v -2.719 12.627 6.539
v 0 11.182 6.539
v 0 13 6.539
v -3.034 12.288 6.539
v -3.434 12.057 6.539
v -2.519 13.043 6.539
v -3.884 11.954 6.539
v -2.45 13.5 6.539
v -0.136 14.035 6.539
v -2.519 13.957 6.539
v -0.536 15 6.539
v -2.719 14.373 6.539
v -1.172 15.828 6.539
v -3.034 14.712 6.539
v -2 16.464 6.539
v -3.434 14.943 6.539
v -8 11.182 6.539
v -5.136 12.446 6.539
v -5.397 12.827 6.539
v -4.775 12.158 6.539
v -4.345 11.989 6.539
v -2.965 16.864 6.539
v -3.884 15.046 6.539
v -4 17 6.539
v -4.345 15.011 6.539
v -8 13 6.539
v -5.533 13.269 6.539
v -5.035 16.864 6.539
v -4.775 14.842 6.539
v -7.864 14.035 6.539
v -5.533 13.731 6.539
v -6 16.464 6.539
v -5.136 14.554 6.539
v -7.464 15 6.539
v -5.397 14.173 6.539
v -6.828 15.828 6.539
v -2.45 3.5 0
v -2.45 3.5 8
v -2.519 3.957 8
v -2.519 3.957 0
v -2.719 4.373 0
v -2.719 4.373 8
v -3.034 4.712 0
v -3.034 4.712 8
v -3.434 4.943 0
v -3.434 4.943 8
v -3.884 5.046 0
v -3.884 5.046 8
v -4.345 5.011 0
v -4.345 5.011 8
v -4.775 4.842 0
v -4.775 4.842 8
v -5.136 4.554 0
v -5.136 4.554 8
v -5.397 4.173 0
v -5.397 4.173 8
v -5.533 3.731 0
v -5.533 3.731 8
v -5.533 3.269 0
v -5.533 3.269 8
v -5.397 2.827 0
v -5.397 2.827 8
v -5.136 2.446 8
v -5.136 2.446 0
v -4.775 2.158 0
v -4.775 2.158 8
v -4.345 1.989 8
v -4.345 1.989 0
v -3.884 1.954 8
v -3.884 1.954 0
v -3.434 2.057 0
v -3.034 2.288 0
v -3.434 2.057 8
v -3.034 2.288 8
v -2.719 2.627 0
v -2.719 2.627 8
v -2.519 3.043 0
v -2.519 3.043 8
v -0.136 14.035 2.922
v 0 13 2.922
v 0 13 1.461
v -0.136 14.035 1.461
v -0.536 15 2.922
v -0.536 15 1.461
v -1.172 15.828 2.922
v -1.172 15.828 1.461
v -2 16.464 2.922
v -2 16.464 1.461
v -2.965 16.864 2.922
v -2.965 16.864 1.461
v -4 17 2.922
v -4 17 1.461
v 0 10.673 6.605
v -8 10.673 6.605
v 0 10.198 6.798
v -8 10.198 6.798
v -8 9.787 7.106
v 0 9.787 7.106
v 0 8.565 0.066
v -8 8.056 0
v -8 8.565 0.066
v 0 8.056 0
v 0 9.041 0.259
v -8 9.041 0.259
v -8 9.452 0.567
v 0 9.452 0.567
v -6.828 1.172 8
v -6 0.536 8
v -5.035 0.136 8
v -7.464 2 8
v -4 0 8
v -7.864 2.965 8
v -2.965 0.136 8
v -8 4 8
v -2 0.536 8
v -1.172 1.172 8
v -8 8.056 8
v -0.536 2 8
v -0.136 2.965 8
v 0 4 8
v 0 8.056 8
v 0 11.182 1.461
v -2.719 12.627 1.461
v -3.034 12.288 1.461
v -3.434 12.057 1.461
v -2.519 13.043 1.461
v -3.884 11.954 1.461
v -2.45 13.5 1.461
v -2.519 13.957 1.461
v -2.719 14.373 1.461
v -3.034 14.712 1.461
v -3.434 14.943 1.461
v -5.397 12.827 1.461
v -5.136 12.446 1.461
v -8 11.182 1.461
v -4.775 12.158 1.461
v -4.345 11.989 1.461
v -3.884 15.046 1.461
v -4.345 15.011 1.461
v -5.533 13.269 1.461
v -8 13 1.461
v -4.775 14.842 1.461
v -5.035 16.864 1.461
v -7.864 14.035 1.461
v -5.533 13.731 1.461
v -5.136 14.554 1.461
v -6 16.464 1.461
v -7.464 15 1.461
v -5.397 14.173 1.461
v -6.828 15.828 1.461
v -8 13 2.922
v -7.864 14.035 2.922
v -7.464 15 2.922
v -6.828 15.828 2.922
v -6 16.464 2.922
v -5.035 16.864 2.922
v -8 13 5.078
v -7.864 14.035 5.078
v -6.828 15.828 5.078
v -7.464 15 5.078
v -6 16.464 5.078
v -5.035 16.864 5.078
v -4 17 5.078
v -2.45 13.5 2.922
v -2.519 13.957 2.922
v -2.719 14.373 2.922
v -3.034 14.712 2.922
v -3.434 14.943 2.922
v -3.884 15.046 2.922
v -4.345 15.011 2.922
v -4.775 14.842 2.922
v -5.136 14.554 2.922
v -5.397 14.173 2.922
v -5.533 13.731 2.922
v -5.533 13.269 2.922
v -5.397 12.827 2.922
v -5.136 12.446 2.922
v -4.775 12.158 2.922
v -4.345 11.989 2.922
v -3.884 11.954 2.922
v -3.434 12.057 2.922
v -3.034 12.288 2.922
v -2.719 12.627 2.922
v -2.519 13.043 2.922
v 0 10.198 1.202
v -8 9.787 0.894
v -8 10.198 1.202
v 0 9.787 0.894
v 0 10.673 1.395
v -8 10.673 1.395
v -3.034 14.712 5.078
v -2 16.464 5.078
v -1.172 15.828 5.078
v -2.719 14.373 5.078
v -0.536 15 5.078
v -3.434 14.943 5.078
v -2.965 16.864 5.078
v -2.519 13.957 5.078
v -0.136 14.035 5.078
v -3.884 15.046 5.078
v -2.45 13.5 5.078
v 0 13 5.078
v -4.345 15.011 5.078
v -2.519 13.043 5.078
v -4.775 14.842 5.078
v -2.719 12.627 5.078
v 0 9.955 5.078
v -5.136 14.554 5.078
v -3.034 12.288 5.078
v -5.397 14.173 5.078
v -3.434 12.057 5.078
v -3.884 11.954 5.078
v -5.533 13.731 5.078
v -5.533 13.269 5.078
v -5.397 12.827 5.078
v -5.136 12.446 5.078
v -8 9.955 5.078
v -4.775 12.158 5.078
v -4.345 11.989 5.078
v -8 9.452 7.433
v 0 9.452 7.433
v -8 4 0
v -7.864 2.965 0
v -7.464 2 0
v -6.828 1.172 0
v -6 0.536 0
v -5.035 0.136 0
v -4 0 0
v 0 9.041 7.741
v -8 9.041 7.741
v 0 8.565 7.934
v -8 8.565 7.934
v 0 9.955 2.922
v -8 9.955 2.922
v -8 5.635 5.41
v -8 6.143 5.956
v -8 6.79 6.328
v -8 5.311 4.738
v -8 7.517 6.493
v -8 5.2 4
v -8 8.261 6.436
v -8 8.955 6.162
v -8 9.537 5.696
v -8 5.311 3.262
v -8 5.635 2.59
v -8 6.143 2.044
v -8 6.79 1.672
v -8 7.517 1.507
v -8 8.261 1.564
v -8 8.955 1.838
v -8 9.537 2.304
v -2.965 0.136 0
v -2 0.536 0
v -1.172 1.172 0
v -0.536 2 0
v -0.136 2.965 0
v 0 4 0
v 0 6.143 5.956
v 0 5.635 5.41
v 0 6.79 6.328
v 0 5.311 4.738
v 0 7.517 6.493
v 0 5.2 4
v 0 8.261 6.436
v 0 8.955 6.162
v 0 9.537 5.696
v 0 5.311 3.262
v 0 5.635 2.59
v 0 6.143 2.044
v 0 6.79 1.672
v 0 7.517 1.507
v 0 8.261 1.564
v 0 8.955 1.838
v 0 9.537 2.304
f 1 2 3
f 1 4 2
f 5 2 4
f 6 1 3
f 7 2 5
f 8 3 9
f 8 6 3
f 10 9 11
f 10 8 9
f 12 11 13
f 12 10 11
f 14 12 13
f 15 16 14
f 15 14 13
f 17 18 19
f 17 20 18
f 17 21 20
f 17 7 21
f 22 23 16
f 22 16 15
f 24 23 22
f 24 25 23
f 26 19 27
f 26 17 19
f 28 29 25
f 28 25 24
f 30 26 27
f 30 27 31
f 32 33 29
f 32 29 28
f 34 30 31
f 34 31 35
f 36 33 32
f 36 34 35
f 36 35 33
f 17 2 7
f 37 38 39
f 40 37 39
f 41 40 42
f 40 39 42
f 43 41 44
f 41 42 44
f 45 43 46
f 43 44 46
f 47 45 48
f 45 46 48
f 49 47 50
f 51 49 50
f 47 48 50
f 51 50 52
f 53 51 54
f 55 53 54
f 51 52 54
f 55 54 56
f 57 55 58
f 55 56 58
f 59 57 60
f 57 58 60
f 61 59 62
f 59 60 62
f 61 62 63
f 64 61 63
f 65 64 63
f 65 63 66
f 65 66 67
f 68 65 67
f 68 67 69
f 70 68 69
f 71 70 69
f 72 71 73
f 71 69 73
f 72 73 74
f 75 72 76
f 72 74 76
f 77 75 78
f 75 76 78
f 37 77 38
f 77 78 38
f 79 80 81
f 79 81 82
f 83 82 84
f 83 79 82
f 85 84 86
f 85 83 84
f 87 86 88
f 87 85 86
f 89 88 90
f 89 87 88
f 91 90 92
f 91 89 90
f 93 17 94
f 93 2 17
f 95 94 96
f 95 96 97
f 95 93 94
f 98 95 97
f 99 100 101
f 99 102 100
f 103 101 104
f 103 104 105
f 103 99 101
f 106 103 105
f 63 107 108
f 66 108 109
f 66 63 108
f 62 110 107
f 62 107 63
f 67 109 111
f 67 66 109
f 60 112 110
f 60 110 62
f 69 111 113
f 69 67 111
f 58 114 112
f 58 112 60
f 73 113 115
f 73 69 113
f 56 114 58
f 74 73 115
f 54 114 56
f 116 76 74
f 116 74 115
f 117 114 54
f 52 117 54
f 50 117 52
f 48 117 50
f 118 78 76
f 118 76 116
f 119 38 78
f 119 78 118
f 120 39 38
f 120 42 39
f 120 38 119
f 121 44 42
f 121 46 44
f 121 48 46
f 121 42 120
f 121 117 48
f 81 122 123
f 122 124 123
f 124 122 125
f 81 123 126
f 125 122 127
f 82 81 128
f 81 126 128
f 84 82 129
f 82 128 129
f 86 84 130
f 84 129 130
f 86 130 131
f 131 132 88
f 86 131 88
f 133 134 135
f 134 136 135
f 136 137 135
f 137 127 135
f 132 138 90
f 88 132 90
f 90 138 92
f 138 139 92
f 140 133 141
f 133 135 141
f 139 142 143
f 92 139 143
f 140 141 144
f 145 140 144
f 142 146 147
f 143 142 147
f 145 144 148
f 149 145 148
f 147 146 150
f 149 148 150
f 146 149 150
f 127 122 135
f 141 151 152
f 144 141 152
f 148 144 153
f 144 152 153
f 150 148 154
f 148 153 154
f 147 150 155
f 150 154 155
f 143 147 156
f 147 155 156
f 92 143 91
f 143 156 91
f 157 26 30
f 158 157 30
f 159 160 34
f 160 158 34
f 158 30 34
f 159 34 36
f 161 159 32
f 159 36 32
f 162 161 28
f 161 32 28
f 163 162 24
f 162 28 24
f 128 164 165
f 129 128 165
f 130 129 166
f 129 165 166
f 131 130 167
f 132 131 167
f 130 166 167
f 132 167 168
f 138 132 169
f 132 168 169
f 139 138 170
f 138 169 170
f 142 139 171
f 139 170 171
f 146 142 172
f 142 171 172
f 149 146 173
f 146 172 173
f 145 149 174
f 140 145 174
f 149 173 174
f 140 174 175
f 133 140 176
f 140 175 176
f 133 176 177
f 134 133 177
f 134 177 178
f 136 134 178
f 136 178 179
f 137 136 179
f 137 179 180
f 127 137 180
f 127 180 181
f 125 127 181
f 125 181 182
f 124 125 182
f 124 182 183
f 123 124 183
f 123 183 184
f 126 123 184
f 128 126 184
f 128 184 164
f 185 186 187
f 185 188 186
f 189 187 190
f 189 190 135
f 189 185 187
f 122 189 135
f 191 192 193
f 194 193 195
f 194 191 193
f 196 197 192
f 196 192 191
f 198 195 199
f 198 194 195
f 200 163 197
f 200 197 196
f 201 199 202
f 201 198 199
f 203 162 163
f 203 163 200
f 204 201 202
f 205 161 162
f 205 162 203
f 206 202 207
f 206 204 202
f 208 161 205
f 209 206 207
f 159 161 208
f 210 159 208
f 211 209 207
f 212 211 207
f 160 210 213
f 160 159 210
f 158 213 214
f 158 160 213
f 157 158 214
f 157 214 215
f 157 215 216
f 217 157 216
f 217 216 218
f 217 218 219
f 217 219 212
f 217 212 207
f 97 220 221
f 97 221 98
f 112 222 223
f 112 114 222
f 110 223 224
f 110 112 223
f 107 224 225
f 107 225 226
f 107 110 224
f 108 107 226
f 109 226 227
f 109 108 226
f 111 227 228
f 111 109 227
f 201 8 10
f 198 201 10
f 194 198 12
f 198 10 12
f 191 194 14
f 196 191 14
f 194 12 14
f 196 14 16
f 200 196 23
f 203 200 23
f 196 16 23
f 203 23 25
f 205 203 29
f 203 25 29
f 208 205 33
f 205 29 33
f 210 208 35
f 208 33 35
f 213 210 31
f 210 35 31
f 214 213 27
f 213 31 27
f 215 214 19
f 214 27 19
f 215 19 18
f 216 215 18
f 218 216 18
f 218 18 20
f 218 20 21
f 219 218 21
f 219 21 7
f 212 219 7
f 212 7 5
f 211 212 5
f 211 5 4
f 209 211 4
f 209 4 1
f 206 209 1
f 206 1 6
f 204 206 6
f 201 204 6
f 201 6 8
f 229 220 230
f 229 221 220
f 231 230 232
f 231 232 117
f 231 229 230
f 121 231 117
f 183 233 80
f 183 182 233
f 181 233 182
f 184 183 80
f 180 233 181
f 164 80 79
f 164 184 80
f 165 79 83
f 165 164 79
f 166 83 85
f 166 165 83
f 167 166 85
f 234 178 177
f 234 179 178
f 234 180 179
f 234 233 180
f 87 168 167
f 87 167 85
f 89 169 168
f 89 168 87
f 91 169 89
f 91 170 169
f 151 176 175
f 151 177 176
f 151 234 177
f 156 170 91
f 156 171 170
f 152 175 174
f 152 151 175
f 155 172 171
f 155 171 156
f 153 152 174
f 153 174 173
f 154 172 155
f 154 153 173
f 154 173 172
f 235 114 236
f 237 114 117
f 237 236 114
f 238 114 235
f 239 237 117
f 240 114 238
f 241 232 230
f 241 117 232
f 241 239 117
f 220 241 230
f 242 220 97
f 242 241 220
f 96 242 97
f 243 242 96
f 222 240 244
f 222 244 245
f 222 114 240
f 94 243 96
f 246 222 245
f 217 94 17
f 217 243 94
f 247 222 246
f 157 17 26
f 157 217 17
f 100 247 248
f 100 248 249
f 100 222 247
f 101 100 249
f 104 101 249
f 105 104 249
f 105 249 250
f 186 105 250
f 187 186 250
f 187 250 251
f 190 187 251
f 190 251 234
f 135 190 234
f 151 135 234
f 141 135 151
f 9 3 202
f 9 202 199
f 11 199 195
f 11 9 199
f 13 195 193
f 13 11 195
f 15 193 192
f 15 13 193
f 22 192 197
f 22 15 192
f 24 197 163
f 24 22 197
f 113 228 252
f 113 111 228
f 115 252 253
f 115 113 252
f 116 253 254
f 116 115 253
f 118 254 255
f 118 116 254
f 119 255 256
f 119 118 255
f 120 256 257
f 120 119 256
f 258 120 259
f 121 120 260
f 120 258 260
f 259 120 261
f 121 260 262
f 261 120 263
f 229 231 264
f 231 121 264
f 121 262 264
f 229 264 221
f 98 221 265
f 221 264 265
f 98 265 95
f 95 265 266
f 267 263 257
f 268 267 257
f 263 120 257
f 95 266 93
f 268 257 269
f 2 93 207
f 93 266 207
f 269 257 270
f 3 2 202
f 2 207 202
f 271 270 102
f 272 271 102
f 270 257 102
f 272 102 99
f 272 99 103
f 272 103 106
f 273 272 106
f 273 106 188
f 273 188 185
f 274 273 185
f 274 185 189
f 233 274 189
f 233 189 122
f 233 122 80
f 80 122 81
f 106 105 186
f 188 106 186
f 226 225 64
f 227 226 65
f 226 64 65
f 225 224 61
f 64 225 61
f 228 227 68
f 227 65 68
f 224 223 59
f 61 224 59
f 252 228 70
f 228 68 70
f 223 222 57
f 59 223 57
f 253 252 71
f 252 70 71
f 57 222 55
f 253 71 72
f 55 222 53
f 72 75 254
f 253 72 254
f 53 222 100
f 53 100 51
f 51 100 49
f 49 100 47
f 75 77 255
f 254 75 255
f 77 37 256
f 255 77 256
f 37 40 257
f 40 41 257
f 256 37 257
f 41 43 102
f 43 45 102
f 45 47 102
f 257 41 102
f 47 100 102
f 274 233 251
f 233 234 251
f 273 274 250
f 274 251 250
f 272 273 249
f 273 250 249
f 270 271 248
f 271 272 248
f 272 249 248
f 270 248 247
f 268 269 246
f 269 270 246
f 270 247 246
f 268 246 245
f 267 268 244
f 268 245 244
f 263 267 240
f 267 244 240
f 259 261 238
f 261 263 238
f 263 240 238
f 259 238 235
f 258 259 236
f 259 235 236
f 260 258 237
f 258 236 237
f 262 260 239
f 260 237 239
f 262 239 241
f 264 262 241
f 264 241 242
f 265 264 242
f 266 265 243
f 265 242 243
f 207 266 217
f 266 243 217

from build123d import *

# Parameters (mm, degrees)
SKETCH_1_W          = 8
SKETCH_1_H          = 17
EXTRUDE_2_DEPTH     = 8
FILLET_2_R          = 4
SKETCH_2_R          = 1.55
CUT_EXTRUDE_1_DEPTH = 8
SKETCH_3_R          = 2.5
CUT_EXTRUDE_2_DEPTH = 8
CUT_EXTRUDE_4_DEPTH = 8
CUT_EXTRUDE_5_DEPTH = 8
FILLET_3_R          = 2


with BuildPart() as part:
    # 草图1 → 凸台-拉伸2 (new body)
    with BuildSketch(Plane.XY):
        with Locations((-4, 8.5)):
            Rectangle(SKETCH_1_W, SKETCH_1_H)
    extrude(amount=EXTRUDE_2_DEPTH)

    # 圆角2
    fillet_2_edges = [part.edges().sort_by_distance(p)[0] for p in [
        (0, 0, 4),
        (-8, 0, 4),
        (0, 17, 4),
        (-8, 17, 4),
    ]]
    fillet(fillet_2_edges, radius=FILLET_2_R - 0.0001)  # a hair under: the kernel refuses the full size

    # 草图2 → 切除-拉伸1 (cut)
    with BuildSketch(Plane.XY.offset(8)):
        with Locations((-4, 13.5)):
            Circle(SKETCH_2_R)
        with Locations((-4, 3.5)):
            Circle(SKETCH_2_R)
    extrude(amount=-CUT_EXTRUDE_1_DEPTH, mode=Mode.SUBTRACT)

    # 草图3 → 切除-拉伸2 (cut)
    with BuildSketch(Plane.ZY.offset(8)):
        with Locations((4, 7.7)):
            Circle(SKETCH_3_R)
    extrude(amount=-CUT_EXTRUDE_2_DEPTH, mode=Mode.SUBTRACT)

    # 草图4 → 切除-拉伸4 (cut)
    with BuildSketch(Plane.ZY.offset(8)):
        with BuildLine():
            Line((2.921520253, 9.955411589), (2.921520253, 17))
            Line((2.921520253, 17), (5.078479747, 17))
            Line((5.078479747, 17), (5.078479747, 9.955411589))
            Line((5.078479747, 9.955411589), (5.078479747, 9.786617836))
            ThreePointArc((5.078479747, 9.786617836), (4, 10.033067636), (2.921520253, 9.786617836))
            Line((2.921520253, 9.786617836), (2.921520253, 9.955411589))
        make_face()
    extrude(amount=-CUT_EXTRUDE_4_DEPTH, mode=Mode.SUBTRACT)

    # 草图5 → 切除-拉伸5 (cut)
    with BuildSketch(Plane.ZY.offset(8)):
        Polygon((0, 8.869306394), (1.460760126, 10.369306394), (1.460760126, 17), (0, 17), align=None)
        Polygon((8, 17), (8, 8.869306394), (6.539239874, 10.369306394), (6.539239874, 17), align=None)
    extrude(amount=-CUT_EXTRUDE_5_DEPTH, mode=Mode.SUBTRACT)

    # 圆角3
    fillet_3_edges = [part.edges().sort_by_distance(p)[0] for p in [
        (-4, 10.369306394, 6.539239874),
        (-4, 8.869306394, 8),
        (-4, 8.869306394, 0),
        (-4, 10.369306394, 1.460760126),
    ]]
    fillet(fillet_3_edges, radius=FILLET_3_R)


solid = part.part
